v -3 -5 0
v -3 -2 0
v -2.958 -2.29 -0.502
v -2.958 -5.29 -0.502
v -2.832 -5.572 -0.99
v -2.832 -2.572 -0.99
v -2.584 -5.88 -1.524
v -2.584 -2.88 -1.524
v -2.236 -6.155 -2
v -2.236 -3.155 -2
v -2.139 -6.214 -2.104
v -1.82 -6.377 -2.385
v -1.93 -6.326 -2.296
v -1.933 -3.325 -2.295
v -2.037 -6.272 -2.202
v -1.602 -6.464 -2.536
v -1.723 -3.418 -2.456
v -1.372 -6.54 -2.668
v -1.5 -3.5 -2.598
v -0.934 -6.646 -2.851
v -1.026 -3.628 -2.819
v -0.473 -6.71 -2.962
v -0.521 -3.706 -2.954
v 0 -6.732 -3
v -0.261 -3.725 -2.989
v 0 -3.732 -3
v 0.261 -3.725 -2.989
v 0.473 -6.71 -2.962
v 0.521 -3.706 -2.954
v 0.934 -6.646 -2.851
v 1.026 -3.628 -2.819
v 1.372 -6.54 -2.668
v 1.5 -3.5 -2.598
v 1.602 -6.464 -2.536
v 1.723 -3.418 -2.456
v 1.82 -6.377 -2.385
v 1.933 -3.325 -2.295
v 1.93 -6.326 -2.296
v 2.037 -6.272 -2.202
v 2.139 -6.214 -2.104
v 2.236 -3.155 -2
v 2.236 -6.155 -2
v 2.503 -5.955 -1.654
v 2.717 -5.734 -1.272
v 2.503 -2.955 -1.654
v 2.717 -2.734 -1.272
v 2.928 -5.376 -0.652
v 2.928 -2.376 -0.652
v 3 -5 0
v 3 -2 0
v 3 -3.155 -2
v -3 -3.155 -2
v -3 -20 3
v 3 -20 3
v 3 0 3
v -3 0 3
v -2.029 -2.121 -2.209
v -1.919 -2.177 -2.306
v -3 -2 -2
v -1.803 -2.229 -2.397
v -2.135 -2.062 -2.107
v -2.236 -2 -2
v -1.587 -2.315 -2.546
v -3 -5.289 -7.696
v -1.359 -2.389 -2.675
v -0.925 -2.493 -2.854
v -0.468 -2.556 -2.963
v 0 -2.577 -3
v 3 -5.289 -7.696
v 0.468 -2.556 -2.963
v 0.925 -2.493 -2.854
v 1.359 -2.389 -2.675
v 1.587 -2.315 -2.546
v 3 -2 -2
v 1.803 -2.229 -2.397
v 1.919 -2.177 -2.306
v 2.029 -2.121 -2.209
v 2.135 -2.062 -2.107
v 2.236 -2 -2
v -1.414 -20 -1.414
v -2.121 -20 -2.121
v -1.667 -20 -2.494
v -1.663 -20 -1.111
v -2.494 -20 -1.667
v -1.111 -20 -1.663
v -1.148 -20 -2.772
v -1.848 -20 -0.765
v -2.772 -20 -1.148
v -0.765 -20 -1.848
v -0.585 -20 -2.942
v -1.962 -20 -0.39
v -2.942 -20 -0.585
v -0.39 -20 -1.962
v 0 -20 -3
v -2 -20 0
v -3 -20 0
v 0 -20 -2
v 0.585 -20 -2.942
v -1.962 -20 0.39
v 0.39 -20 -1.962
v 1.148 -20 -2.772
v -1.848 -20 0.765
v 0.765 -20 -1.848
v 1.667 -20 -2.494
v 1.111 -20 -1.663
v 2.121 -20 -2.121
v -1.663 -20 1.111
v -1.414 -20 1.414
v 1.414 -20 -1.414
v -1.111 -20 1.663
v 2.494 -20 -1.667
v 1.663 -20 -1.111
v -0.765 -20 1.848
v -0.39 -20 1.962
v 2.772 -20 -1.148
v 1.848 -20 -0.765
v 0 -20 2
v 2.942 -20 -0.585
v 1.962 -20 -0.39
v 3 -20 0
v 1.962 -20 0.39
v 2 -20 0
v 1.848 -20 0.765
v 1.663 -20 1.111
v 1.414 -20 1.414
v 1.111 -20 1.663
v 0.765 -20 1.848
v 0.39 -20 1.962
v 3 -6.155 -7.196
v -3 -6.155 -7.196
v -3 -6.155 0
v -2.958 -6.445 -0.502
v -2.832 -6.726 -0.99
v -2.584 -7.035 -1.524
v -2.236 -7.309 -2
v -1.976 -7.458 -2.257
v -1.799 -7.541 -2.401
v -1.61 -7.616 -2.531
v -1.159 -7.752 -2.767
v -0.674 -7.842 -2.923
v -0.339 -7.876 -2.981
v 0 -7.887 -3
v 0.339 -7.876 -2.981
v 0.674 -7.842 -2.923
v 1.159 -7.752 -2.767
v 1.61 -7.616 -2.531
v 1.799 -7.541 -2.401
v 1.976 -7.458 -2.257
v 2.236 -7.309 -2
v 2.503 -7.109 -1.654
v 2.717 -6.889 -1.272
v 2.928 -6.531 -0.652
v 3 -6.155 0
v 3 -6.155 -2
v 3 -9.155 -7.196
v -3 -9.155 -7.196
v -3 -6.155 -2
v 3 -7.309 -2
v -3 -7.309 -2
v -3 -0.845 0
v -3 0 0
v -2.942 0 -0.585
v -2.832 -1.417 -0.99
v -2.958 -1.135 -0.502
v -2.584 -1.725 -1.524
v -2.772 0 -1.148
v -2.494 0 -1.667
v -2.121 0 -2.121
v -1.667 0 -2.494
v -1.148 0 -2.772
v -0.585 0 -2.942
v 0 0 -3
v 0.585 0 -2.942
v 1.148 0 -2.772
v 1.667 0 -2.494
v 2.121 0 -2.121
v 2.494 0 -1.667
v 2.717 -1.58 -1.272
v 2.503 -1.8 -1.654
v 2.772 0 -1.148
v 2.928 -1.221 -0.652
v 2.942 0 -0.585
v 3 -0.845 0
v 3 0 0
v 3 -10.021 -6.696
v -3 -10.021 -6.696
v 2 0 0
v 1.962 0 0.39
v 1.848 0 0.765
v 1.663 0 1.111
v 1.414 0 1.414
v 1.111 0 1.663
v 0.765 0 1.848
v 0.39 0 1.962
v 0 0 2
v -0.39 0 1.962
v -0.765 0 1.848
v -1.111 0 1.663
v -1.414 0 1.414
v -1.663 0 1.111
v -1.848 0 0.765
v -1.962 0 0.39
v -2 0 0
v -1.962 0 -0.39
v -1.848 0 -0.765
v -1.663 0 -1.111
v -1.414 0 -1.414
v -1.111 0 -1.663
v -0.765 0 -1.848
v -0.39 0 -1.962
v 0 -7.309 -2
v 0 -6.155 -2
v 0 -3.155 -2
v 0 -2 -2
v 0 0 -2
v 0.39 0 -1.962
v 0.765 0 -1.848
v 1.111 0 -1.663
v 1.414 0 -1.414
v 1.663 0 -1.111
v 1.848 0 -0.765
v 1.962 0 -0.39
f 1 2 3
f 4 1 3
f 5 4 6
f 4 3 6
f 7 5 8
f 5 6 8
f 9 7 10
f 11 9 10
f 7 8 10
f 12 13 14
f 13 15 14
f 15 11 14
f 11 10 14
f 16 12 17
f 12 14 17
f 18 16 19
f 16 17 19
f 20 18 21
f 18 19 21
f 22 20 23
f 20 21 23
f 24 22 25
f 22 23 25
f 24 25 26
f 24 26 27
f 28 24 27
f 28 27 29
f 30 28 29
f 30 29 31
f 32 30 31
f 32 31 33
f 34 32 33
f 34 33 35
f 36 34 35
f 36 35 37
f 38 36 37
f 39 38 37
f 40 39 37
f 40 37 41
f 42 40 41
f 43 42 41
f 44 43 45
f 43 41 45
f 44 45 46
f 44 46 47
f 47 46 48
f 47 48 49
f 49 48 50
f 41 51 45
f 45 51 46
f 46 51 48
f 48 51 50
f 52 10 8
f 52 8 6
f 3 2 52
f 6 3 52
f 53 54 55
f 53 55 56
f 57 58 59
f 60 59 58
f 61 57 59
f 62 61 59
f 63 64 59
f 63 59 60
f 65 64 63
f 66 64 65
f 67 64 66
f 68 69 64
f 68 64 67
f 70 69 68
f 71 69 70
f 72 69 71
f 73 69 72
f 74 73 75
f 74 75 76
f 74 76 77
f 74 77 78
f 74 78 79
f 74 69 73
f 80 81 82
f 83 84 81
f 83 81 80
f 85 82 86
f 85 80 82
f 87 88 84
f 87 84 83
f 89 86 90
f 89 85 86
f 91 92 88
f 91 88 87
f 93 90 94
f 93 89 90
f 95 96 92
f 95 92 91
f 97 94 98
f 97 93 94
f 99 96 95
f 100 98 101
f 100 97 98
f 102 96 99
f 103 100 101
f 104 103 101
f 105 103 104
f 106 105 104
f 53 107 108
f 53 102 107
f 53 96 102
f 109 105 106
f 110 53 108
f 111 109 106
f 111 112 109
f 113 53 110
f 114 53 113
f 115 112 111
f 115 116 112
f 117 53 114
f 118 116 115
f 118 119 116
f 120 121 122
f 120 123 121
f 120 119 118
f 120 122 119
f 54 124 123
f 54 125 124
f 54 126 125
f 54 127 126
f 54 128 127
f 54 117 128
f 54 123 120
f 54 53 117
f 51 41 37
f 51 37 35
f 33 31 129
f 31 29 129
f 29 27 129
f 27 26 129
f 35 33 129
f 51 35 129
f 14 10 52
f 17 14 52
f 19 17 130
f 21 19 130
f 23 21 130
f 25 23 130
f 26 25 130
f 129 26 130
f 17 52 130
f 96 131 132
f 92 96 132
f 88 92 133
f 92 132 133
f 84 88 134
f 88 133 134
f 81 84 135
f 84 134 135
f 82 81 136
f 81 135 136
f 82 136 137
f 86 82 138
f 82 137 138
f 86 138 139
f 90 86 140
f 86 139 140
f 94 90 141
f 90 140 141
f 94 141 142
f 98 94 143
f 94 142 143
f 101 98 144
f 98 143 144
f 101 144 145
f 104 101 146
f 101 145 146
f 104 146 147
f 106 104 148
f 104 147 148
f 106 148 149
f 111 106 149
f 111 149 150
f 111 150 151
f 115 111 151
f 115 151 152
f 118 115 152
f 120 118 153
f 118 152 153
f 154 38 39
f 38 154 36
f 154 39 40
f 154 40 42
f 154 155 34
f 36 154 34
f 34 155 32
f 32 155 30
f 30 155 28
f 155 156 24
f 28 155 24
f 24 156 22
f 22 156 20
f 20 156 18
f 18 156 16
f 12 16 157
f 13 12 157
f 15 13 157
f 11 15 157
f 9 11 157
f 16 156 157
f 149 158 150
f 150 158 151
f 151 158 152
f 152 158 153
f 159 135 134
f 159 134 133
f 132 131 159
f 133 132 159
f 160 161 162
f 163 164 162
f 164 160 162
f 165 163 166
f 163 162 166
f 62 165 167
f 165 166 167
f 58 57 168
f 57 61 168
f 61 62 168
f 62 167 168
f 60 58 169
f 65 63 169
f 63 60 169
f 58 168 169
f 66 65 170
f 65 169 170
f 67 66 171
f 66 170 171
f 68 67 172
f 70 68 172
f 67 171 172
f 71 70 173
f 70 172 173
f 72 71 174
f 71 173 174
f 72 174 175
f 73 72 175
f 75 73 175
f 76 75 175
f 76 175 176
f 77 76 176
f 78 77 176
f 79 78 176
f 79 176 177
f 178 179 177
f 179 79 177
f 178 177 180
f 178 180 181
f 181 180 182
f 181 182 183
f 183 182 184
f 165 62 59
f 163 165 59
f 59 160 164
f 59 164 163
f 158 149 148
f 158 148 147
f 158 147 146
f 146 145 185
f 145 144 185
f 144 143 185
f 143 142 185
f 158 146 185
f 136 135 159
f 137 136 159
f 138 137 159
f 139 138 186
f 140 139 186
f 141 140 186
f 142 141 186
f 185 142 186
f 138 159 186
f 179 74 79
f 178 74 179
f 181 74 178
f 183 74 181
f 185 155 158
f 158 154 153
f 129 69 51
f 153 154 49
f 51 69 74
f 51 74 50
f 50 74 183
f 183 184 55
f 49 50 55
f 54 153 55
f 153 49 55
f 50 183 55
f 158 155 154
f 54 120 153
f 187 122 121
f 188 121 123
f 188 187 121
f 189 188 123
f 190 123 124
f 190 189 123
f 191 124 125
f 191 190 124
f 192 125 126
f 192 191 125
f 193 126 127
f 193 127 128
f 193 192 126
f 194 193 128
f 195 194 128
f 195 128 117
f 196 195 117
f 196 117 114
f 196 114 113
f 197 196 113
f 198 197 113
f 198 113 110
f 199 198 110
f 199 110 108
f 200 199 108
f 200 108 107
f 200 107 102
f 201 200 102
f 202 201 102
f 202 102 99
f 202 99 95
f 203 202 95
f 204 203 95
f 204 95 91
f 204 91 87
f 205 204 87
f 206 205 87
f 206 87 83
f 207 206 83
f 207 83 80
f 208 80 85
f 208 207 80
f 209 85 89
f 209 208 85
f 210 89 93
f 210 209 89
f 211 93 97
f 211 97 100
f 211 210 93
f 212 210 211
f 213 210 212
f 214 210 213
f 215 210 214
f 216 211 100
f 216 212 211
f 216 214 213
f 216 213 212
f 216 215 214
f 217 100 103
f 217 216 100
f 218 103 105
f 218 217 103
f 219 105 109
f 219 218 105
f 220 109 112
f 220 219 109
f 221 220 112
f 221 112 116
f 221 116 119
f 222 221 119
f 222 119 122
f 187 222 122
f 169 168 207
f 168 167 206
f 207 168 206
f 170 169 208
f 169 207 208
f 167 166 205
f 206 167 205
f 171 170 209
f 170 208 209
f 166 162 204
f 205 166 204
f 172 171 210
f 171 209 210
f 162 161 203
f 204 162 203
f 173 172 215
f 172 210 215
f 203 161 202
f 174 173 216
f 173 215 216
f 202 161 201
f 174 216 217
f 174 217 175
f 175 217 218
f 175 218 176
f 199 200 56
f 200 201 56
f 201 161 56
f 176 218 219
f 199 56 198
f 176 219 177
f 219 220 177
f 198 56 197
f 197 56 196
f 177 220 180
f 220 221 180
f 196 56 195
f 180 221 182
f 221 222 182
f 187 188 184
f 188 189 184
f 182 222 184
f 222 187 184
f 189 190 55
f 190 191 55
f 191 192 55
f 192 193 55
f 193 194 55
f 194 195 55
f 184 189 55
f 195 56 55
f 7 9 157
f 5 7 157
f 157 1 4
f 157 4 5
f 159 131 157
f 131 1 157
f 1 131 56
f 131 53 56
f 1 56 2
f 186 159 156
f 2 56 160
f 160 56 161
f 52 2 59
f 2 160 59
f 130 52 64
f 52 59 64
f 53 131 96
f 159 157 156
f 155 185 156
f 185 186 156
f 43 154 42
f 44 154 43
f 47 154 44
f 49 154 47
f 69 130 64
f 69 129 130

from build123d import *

# Parameters (mm, degrees)
F0_R          = 2
F1_DEPTH      = 20
F3_DEPTH      = 3
F3_DEPTH_BACK = 3
F6_DEPTH      = 1
F9_DEPTH      = 1
F10_DEPTH     = 20


with BuildPart() as f1:
    # F0 (on Front) → F1 (new body)
    with BuildSketch(Plane.XZ):
        with BuildLine():
            ThreePointArc((-3, 0), (0, -3), (3, 0))
            ThreePointArc((3, 0), (2.1213203436, 2.1213203436), (0, 3))
            ThreePointArc((0, 3), (-2.1213203436, 2.1213203436), (-3, 0))
        make_face()
        Circle(F0_R, mode=Mode.SUBTRACT)
    extrude(amount=F1_DEPTH)

    # F2 (on Right) → F3 (join, two sides)
    with BuildSketch(Plane.YZ) as f3_sk:
        Polygon((-5.2886751346, -7.6961524227), (-2, -2), (-3.1547005384, -2), (-6.1547005384, -7.1961524227), align=None)
        Polygon((-9.1547005384, -7.1961524227), (-6.1547005384, -2), (-7.3094010768, -2), (-10.0207259422, -6.6961524227), align=None)
    extrude(amount=F3_DEPTH)
    extrude(f3_sk.sketch, amount=-F3_DEPTH_BACK)

    # F5 (on offset) → F6 (join)
    with BuildSketch(Plane(origin=(0, -0.6339745962, 0.3660254038), x_dir=(-1, 0, 0), z_dir=(0, 0.8660254038, -0.5))):
        Polygon((3, -4), (3, 0), (1.5, -4), align=None)
        Polygon((-1.5, -4), (-3, 0), (-3, -4), align=None)
    extrude(amount=-F6_DEPTH)

    # F8 (on offset) → F9 (join)
    with BuildSketch(Plane(origin=(0, -3.75, 2.1650635095), x_dir=(-1, 0, 0), z_dir=(0, 0.8660254038, -0.5))):
        Polygon((3, -6), (3, -2.5), (1.5, -6), align=None)
        Polygon((-3, -6), (-1.5, -6), (-3, -2.5), align=None)
    extrude(amount=-F9_DEPTH)

    # F0 (on Front) → F10 (join)
    with BuildSketch(Plane.XZ):
        with BuildLine():
            ThreePointArc((-3, 0), (0, -3), (3, 0))
            ThreePointArc((3, 0), (2.1213203436, 2.1213203436), (0, 3))
            ThreePointArc((0, 3), (-2.1213203436, 2.1213203436), (-3, 0))
        make_face()
        Circle(F0_R, mode=Mode.SUBTRACT)
        with BuildLine():
            ThreePointArc((0, 3), (2.1213203436, 2.1213203436), (3, 0))
            Line((3, 0), (3, 3))
            Line((3, 3), (0, 3))
        make_face()
        with BuildLine():
            ThreePointArc((-3, 0), (-2.1213203436, 2.1213203436), (0, 3))
            Line((0, 3), (-3, 3))
            Line((-3, 3), (-3, 0))
        make_face()
    extrude(amount=F10_DEPTH)


solid = f1.part
